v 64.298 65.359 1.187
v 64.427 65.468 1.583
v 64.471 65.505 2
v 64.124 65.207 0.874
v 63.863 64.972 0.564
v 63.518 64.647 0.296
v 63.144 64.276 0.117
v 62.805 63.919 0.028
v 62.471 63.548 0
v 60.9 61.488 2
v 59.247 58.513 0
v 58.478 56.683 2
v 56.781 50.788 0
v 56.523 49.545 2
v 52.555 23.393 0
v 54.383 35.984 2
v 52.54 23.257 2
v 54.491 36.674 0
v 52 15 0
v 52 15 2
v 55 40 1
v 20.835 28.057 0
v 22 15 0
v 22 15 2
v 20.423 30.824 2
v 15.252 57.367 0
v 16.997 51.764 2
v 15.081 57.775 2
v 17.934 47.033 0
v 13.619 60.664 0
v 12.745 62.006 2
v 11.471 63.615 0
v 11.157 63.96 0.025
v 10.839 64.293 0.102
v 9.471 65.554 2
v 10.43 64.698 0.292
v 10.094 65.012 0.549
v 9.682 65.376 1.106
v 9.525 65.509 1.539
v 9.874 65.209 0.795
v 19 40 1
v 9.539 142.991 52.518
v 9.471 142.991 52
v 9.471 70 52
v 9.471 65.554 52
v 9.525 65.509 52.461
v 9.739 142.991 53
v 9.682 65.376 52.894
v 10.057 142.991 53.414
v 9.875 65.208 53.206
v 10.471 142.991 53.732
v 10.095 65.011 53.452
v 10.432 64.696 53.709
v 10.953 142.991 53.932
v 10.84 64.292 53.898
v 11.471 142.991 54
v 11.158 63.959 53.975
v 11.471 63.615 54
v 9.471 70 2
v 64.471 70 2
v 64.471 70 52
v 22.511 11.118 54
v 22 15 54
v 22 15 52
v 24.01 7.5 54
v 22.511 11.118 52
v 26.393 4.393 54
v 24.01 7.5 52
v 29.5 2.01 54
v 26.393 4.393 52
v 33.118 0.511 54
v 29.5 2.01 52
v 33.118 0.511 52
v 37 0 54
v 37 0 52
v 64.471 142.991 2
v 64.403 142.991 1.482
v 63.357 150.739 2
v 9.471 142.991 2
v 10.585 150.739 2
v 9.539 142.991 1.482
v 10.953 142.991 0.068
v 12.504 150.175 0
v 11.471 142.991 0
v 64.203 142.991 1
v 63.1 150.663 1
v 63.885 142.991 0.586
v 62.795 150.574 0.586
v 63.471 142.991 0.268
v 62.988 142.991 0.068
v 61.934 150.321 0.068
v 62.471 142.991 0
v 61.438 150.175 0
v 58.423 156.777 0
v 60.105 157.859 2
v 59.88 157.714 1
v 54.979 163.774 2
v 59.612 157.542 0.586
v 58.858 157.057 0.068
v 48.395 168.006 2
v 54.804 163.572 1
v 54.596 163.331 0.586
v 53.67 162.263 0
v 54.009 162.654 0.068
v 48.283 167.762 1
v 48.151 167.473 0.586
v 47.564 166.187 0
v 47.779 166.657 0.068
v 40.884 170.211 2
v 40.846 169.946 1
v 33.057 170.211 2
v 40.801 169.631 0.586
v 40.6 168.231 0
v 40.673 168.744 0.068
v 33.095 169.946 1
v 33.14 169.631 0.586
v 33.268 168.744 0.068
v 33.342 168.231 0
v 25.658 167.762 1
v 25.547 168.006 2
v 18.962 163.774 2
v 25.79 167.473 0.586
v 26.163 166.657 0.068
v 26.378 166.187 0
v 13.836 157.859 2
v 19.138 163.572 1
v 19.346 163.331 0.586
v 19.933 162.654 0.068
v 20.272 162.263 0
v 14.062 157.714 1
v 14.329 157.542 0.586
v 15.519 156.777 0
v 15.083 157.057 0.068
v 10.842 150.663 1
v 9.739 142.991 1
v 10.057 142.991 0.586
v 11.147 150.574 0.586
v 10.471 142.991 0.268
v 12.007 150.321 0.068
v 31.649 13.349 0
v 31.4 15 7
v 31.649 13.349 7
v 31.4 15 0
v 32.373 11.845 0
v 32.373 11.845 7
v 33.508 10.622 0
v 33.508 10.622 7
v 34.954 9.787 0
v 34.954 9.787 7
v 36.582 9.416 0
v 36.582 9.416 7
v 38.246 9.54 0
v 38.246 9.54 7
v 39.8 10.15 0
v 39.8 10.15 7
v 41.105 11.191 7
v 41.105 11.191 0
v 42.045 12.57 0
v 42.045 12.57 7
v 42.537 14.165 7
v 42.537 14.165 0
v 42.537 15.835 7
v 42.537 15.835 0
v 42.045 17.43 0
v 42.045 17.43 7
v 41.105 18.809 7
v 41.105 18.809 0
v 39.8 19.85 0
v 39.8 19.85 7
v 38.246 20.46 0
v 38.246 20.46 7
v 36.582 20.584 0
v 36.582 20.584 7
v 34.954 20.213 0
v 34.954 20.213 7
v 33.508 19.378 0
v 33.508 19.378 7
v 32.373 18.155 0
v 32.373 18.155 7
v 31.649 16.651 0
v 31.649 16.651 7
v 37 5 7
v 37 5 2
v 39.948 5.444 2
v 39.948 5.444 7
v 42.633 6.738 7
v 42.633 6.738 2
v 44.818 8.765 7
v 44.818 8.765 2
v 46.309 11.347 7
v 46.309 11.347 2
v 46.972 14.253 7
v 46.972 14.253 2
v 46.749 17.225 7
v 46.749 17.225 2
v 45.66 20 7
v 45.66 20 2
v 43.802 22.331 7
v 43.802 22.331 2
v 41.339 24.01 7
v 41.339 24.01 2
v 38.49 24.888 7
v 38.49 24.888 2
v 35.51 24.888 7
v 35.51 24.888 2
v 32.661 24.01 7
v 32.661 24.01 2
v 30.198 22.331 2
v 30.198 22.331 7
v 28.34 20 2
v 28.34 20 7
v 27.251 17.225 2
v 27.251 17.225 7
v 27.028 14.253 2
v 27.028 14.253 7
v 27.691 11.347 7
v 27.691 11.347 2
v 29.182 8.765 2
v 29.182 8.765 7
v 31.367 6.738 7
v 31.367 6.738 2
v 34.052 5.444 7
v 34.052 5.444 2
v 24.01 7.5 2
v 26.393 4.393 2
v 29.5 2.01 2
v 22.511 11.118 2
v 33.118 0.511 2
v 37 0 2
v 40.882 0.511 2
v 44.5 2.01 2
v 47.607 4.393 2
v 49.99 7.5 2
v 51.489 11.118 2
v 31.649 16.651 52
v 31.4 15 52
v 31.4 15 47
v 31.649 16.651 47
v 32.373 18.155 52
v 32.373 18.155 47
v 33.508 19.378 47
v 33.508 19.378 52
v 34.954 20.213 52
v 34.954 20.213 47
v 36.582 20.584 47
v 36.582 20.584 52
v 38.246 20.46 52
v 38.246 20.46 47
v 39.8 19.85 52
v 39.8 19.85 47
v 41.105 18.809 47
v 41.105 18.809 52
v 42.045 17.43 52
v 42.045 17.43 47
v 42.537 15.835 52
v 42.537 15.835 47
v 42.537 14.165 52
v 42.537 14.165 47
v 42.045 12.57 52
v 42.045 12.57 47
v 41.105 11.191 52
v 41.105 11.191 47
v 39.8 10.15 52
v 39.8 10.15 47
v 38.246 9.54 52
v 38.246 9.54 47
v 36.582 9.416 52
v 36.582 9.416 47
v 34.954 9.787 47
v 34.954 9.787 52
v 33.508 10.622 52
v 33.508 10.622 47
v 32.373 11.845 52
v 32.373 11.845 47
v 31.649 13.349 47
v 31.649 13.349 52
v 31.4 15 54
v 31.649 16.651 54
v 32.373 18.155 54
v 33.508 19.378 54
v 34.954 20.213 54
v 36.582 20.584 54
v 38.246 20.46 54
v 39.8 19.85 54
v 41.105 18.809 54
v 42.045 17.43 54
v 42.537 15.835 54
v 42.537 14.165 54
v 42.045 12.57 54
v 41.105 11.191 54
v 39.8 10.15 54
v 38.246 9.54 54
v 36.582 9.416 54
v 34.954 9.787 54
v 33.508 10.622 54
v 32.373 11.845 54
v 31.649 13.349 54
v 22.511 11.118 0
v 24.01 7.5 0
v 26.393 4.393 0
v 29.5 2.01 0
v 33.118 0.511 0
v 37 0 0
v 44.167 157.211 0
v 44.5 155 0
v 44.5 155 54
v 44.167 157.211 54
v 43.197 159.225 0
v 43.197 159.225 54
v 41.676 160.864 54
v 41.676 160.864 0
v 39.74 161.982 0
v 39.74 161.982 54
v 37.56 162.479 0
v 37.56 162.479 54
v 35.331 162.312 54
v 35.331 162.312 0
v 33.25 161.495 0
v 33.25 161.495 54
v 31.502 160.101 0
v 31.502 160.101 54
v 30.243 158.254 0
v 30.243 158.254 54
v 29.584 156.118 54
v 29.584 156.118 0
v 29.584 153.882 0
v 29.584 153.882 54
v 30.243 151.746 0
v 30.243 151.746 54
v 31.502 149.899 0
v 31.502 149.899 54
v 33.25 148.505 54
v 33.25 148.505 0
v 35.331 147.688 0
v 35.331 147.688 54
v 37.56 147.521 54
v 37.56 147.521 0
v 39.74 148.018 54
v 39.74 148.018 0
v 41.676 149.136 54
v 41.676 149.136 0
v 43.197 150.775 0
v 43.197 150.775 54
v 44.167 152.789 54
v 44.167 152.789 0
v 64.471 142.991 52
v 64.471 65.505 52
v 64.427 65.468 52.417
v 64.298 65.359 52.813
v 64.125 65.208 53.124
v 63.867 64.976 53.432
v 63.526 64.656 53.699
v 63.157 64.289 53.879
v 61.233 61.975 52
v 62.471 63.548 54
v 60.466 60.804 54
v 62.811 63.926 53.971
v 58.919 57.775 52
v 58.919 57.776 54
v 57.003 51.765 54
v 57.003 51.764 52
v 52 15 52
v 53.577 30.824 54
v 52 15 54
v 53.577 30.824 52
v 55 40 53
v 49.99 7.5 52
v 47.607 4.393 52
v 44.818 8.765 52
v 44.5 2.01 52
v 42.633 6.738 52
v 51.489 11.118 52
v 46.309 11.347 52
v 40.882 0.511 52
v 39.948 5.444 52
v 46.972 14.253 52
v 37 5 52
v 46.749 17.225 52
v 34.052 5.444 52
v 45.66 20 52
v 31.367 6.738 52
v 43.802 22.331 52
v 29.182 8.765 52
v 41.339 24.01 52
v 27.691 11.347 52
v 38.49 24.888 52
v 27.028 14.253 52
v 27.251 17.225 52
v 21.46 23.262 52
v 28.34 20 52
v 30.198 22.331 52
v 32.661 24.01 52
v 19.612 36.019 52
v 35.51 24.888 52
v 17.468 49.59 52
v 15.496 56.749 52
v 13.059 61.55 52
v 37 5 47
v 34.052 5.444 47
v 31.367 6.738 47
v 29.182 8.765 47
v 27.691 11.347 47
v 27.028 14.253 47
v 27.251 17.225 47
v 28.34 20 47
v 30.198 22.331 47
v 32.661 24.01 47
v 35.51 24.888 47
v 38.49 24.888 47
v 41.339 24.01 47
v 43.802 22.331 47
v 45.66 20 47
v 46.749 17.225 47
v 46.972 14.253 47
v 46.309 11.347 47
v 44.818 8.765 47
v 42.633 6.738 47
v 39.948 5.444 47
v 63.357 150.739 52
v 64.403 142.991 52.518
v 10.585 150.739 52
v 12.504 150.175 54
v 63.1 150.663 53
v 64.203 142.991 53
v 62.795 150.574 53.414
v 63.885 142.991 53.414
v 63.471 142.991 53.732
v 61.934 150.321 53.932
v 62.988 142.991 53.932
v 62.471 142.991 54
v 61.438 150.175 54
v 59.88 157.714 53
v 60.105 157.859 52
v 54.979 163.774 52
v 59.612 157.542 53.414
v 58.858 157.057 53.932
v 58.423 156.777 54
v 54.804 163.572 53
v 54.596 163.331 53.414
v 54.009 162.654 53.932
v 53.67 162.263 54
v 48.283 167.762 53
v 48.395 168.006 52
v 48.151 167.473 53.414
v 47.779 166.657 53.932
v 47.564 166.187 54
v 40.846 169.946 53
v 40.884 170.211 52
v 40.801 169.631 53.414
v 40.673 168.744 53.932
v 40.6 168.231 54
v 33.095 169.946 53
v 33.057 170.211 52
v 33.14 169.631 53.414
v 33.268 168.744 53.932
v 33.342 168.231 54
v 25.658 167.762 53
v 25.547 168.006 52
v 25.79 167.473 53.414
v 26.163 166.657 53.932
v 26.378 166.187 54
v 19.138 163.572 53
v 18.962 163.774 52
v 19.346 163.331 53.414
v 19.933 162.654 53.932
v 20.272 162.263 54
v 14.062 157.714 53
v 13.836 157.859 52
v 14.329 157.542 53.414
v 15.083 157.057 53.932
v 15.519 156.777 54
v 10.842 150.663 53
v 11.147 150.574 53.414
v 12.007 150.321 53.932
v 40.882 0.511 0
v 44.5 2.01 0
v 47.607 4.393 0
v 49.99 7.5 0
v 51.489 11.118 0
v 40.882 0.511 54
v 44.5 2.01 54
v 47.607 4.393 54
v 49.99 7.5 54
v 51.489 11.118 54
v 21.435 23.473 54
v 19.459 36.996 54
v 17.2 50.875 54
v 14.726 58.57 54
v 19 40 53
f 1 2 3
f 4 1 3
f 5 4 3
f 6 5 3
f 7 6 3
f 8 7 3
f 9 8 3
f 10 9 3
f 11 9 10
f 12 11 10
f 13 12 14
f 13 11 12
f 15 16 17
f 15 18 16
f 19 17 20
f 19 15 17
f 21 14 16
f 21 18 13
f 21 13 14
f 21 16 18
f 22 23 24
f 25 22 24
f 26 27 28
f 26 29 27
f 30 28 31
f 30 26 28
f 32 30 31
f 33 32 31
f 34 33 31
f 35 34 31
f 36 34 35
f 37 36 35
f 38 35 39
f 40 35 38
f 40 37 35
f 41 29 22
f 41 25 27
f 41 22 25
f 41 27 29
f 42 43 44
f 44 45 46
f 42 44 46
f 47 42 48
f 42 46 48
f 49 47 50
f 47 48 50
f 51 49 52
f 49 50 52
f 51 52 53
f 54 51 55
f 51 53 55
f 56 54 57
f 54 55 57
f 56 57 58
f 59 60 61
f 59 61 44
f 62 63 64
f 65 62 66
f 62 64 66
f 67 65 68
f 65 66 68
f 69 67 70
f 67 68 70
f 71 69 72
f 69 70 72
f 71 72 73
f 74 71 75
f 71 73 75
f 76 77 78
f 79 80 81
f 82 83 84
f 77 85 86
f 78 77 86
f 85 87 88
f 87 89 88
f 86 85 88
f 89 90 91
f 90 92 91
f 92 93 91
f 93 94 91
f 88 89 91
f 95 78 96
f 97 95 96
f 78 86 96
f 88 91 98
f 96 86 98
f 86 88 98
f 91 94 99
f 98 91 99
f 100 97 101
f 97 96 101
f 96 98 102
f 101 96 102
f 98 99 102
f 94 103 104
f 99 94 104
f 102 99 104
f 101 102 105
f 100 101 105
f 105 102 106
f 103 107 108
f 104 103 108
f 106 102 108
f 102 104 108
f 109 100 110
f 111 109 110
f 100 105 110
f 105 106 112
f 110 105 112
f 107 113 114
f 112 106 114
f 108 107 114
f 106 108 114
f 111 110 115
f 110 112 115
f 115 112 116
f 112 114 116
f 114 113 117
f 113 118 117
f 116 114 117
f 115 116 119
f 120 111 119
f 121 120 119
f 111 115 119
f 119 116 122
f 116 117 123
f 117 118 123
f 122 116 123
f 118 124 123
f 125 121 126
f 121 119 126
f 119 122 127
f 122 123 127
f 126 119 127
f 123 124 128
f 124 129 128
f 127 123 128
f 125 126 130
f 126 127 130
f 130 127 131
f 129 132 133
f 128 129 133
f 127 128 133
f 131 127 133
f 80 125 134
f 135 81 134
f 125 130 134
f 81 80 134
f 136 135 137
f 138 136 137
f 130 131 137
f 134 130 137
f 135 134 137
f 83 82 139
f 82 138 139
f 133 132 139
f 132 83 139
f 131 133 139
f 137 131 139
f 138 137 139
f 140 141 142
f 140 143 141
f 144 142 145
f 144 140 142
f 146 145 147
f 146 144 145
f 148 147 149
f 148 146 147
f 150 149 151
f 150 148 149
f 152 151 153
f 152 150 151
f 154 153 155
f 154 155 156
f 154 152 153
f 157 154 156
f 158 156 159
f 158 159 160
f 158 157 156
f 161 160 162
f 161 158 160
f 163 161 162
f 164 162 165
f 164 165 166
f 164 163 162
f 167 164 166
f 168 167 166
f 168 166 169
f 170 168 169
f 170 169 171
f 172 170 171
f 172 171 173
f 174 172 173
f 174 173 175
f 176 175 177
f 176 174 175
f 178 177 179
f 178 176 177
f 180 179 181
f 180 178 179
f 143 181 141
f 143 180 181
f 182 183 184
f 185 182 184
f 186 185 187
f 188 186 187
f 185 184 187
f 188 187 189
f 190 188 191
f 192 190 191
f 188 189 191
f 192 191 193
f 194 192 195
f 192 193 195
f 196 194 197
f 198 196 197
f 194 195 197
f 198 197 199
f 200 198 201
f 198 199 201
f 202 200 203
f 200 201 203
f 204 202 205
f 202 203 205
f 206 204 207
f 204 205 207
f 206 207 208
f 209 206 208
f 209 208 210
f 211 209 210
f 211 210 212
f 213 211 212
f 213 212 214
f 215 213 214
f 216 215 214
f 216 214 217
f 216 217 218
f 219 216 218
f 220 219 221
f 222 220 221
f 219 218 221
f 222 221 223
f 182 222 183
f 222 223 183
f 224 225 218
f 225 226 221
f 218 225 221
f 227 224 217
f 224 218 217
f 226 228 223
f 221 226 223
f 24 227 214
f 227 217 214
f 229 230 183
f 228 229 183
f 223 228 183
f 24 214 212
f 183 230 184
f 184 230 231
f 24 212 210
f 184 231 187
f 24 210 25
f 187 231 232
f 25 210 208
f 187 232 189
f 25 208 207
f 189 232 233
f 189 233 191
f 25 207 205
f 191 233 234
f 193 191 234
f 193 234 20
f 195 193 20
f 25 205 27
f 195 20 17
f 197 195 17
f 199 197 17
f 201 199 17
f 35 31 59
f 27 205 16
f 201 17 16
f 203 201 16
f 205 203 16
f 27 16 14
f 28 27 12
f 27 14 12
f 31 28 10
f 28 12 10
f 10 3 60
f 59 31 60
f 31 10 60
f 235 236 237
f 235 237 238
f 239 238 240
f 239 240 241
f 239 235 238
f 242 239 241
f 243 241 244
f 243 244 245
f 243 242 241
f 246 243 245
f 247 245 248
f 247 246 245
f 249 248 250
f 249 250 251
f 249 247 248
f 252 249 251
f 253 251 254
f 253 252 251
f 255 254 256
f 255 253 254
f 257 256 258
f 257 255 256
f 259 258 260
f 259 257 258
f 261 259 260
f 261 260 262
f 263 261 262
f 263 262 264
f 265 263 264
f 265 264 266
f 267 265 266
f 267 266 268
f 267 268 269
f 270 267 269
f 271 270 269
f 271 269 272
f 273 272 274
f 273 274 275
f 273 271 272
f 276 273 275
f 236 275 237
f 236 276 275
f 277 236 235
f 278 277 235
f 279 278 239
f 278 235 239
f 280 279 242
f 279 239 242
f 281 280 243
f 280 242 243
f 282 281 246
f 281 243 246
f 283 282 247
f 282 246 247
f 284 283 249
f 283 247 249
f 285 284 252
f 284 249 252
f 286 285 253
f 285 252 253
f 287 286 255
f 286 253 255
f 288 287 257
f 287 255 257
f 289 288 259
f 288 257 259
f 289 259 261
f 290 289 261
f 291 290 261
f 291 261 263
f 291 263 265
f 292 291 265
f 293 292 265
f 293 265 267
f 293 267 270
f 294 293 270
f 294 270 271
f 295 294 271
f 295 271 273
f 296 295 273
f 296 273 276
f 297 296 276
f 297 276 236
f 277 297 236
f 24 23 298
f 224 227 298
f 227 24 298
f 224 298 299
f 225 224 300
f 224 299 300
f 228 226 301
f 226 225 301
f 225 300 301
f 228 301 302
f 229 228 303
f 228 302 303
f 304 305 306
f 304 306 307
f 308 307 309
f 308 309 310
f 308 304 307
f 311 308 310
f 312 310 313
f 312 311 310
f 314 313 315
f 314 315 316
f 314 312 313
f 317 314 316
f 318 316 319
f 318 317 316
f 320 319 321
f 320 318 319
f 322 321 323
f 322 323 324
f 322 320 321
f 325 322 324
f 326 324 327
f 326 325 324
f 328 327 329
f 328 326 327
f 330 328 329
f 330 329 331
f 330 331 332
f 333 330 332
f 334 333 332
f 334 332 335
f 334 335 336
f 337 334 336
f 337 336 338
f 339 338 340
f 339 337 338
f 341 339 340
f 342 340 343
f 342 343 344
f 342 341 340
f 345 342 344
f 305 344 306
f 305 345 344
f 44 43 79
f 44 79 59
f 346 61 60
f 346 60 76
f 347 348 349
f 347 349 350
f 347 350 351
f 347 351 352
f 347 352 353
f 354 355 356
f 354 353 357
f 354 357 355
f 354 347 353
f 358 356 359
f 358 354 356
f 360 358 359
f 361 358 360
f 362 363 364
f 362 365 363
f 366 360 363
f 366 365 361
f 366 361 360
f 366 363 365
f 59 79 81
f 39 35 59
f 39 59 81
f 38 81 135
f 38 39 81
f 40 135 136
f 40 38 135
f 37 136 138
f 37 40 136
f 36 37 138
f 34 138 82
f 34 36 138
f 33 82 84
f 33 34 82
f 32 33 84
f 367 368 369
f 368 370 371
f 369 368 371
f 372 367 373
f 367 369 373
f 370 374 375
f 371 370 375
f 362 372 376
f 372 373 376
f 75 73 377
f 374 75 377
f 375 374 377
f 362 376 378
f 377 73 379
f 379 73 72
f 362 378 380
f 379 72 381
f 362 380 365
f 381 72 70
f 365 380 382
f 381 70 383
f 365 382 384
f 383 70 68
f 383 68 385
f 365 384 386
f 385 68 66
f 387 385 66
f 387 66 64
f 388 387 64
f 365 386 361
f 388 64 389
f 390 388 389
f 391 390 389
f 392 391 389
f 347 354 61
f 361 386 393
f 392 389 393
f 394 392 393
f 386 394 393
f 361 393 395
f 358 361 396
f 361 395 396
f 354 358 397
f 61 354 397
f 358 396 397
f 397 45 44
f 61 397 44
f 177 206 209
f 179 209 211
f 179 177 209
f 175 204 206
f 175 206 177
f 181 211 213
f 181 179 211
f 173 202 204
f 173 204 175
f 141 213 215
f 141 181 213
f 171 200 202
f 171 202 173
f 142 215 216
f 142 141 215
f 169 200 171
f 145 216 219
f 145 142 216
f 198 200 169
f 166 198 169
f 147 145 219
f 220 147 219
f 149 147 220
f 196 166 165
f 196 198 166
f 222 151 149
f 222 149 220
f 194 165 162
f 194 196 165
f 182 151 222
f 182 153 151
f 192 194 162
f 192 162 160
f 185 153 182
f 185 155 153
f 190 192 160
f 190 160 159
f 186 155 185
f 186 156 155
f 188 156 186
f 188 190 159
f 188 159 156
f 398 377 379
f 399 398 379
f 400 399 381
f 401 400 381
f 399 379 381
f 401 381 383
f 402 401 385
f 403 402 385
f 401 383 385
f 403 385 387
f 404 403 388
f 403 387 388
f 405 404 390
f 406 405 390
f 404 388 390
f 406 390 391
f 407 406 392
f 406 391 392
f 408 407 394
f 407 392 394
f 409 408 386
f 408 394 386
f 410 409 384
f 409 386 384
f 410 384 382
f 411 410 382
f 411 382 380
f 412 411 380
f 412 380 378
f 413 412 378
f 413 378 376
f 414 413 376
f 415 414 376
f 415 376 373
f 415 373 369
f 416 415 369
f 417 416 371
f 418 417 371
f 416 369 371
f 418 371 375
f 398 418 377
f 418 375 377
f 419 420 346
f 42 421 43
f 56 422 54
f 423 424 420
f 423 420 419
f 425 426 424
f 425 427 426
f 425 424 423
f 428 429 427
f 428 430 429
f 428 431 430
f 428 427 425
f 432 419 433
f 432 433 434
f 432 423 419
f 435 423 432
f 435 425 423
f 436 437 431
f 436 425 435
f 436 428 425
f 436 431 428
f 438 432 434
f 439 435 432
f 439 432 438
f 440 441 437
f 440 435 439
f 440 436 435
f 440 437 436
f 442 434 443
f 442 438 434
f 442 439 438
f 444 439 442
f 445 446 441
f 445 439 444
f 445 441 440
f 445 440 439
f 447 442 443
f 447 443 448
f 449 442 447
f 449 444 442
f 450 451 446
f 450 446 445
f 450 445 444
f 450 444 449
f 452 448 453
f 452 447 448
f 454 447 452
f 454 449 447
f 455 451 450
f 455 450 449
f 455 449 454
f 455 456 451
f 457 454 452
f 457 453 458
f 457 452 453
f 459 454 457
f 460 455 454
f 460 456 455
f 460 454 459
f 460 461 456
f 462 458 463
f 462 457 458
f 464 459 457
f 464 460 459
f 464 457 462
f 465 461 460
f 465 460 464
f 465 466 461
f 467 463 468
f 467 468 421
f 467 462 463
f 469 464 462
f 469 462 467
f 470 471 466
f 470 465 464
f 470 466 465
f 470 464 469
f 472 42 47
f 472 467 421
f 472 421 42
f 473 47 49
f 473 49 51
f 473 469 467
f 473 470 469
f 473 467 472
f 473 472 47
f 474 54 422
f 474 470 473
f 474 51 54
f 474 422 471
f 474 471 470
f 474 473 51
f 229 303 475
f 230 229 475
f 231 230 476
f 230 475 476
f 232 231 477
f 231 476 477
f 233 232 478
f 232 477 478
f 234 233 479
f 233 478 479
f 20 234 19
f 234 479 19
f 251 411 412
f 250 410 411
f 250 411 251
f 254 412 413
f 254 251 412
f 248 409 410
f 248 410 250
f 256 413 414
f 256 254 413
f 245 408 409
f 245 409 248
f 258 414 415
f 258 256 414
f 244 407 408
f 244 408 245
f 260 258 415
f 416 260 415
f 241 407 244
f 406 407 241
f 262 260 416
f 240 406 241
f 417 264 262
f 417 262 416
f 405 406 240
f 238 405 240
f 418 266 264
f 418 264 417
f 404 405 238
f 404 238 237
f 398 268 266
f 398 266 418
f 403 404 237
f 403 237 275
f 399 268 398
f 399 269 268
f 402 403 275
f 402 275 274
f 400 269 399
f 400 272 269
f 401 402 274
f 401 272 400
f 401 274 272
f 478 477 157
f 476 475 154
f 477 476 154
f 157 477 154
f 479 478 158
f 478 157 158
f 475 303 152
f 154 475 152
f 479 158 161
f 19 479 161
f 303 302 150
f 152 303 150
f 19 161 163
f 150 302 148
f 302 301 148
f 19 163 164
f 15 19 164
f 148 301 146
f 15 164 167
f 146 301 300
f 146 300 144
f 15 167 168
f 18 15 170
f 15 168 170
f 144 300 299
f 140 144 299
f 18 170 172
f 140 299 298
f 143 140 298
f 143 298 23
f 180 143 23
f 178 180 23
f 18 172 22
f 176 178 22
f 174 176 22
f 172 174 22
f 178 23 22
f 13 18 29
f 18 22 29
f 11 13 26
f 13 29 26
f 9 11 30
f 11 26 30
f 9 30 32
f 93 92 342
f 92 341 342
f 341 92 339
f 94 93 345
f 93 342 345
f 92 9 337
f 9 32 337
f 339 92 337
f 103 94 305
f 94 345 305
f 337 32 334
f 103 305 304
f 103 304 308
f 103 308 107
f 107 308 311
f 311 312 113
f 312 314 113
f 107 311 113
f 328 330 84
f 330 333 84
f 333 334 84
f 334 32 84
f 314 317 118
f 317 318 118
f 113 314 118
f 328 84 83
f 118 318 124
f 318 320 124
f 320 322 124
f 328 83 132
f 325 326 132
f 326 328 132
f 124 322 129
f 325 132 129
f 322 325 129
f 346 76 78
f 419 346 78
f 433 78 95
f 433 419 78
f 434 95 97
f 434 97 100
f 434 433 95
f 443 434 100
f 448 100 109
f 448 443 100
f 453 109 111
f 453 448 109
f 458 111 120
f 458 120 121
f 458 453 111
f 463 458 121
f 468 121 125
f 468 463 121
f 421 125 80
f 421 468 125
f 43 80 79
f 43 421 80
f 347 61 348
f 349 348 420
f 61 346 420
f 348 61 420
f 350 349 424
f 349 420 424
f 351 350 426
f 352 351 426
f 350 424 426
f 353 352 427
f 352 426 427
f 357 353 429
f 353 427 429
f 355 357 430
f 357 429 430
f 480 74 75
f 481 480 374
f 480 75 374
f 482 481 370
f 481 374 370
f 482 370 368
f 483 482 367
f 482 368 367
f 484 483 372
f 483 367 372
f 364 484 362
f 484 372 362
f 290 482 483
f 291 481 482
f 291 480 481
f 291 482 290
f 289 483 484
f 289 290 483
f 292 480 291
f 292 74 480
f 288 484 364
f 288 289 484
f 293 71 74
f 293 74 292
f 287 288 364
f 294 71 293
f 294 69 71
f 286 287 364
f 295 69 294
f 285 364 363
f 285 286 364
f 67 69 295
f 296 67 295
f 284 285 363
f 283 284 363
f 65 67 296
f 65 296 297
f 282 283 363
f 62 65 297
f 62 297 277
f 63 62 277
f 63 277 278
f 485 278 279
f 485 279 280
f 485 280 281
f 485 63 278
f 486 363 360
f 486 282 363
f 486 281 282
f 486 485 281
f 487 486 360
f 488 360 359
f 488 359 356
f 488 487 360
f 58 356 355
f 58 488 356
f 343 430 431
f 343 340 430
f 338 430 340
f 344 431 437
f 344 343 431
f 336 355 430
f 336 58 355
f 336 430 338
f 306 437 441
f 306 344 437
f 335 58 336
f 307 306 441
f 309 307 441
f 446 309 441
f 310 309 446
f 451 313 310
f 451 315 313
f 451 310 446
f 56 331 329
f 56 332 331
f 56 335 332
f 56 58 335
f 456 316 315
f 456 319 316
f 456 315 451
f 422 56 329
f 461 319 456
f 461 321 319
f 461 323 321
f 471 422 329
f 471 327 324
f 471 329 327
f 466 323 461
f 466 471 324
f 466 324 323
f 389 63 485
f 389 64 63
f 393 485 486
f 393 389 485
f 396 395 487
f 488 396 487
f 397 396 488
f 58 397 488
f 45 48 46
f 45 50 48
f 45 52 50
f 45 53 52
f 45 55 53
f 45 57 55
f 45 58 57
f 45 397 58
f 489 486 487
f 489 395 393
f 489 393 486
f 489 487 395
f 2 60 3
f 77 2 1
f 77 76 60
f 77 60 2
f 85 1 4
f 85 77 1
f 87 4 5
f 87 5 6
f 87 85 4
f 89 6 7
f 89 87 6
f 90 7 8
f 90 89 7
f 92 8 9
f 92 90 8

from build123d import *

# Parameters (mm, degrees)
CROQUIS1_R              = 5.6
CROQUIS1_R_2            = 7.5
SALIENTE_EXTRUIR1_DEPTH = 54
CROQUIS6_W              = 54
CROQUIS6_H              = 70
SALIENTE_EXTRUIR3_DEPTH = 74
CORTAR_EXTRUIR13_DEPTH  = 74
CORTAR_EXTRUIR14_DEPTH  = 74
CROQUIS9_W              = 3
CROQUIS9_H              = 11.2
CORTAR_EXTRUIR15_DEPTH  = 74
CROQUIS10_R             = 5.6
CORTAR_EXTRUIR16_DEPTH  = 74
CROQUIS11_R             = 10
CROQUIS11_R_2           = 5.6
SALIENTE_EXTRUIR4_DEPTH = 5
CROQUIS12_R             = 10
CROQUIS12_R_2           = 5.6
SALIENTE_EXTRUIR5_DEPTH = 5
CROQUIS13_W             = 50
CROQUIS13_H             = 73
CORTAR_EXTRUIR17_DEPTH  = 74
CROQUIS14_W             = 74
CROQUIS14_H             = 73
SALIENTE_EXTRUIR6_DEPTH = 54
CORTAR_EXTRUIR18_DEPTH  = 54
REDONDEO3_R             = 2
REDONDEO4_R             = 2


with BuildPart() as part:
    # Croquis1 → Saliente-Extruir1 (new body)
    with BuildSketch(Plane.XY):
        with BuildLine():
            Line((0, 143), (0, 70))
            add(Edge.make_bspline(
                [(22, 15), (22, 22.317960933), (17.777719643, 44.524463784), (15.903513438, 66.300635574), (0, 70)],
                knots=[0, 0, 0, 0, 0.399675276, 1, 1, 1, 1], degree=3))
            ThreePointArc((22, 15), (37, 0), (52, 15))
            add(Edge.make_bspline(
                [(52, 15), (52, 22.317960933), (56.222280357, 44.524463784), (58.096486562, 66.300635574), (74, 70)],
                knots=[0, 0, 0, 0, 0.399675276, 1, 1, 1, 1], degree=3))
            Line((74, 70), (74, 143))
            ThreePointArc((74, 143), (37, 180), (0, 143))
        make_face()
        with Locations((37, 15)):
            Circle(CROQUIS1_R, mode=Mode.SUBTRACT)
        with Locations((37, 155)):
            Circle(CROQUIS1_R_2, mode=Mode.SUBTRACT)
    extrude(amount=SALIENTE_EXTRUIR1_DEPTH)

    # Croquis6 → Saliente-Extruir3 (add)
    with BuildSketch(Plane.ZY):
        with Locations((27, 35)):
            Rectangle(CROQUIS6_W, CROQUIS6_H)
    extrude(amount=-SALIENTE_EXTRUIR3_DEPTH)

    # Croquis7 → Cortar-Extruir13 (cut)
    with BuildSketch(Plane(origin=(74, 0, 0), x_dir=(0, 0, -1), z_dir=(1, 0, 0))):
        Polygon((-52, 0), (-2, 0), (-2, 9.4), (-5, 9.4), (-5, 20.6), (-2, 20.6), (-2, 70), (-52, 70), (-52, 20.6), (-49, 20.6), (-49, 9.4), (-52, 9.4), align=None)
    extrude(amount=-CORTAR_EXTRUIR13_DEPTH, mode=Mode.SUBTRACT)

    # Croquis8 → Cortar-Extruir14 (cut)
    with BuildSketch(Plane(origin=(0, 0, 0), x_dir=(-1, 0, 0), z_dir=(0, 0, -1))):
        with BuildLine():
            add(Edge.make_bspline(
                [(-74, 70), (-58.096486562, 66.300635574), (-56.222280357, 44.524463784), (-52, 22.317960933), (-52, 15)],
                knots=[0, 0, 0, 0, 0.600324724, 1, 1, 1, 1], degree=3))
            Line((-74, 70), (-74, 0))
            Line((-74, 0), (-37, 0))
            ThreePointArc((-37, 0), (-47.606601718, 4.393398282), (-52, 15))
        make_face()
        with BuildLine():
            ThreePointArc((-22, 15), (-26.393398282, 4.393398282), (-37, 0))
            Line((-37, 0), (0, 0))
            Line((0, 0), (0, 70))
            add(Edge.make_bspline(
                [(-22, 15), (-22, 22.317960933), (-17.777719643, 44.524463784), (-15.903513438, 66.300635574), (0, 70)],
                knots=[0, 0, 0, 0, 0.399675276, 1, 1, 1, 1], degree=3))
        make_face()
    extrude(amount=-CORTAR_EXTRUIR14_DEPTH, mode=Mode.SUBTRACT)

    # Croquis9 → Cortar-Extruir15 (cut)
    with BuildSketch(Plane(origin=(74, 0, 0), x_dir=(0, 0, -1), z_dir=(1, 0, 0))):
        with Locations((-50.5, 15)):
            Rectangle(CROQUIS9_W, CROQUIS9_H)
        Polygon((-2, 20.6), (-5.198845147, 20.6), (-5, 9.4), (-2, 9.4), align=None)
    extrude(amount=-CORTAR_EXTRUIR15_DEPTH, mode=Mode.SUBTRACT)

    # Croquis10 → Cortar-Extruir16 (cut)
    with BuildSketch(Plane(origin=(0, 0, 0), x_dir=(-1, 0, 0), z_dir=(0, 0, -1))):
        with Locations((-37, 15)):
            Circle(CROQUIS10_R)
    extrude(amount=-CORTAR_EXTRUIR16_DEPTH, mode=Mode.SUBTRACT)

    # Croquis11 → Saliente-Extruir4 (add)
    with BuildSketch(Plane(origin=(0, 0, 52), x_dir=(-1, 0, 0), z_dir=(0, 0, -1))):
        with Locations(Location((-37, 15, 0), (0, 0, 270))):
            Circle(CROQUIS11_R)
        with Locations((-37, 15)):
            Circle(CROQUIS11_R_2, mode=Mode.SUBTRACT)
    extrude(amount=SALIENTE_EXTRUIR4_DEPTH)

    # Croquis12 → Saliente-Extruir5 (add)
    with BuildSketch(Plane.XY.offset(2)):
        with Locations(Location((37, 15, 0), (0, 0, 270))):
            Circle(CROQUIS12_R)
        with Locations(Location((37, 15, 0), (0, 0, 180))):
            Circle(CROQUIS12_R_2, mode=Mode.SUBTRACT)
    extrude(amount=SALIENTE_EXTRUIR5_DEPTH)

    # Croquis13 → Cortar-Extruir17 (cut)
    with BuildSketch(Plane.ZY):
        with Locations((27, 106.5)):
            Rectangle(CROQUIS13_W, CROQUIS13_H)
    extrude(amount=-CORTAR_EXTRUIR17_DEPTH, mode=Mode.SUBTRACT)

    # Croquis14 → Saliente-Extruir6 (add)
    with BuildSketch(Plane(origin=(0, 0, 0), x_dir=(-1, 0, 0), z_dir=(0, 0, -1))):
        with Locations((-37, 106.5)):
            Rectangle(CROQUIS14_W, CROQUIS14_H)
    extrude(amount=-SALIENTE_EXTRUIR6_DEPTH)

    # Croquis15 → Cortar-Extruir18 (cut)
    with BuildSketch(Plane.XY.offset(54)):
        with BuildLine():
            Line((9.470720421, 142.990900166), (9.470720421, 62.137684014))
            Line((9.470720421, 62.137684014), (-11.518865127, 62.137684014))
            Line((-11.518865127, 62.137684014), (-11.518865127, 188.692436646))
            Line((-11.518865127, 188.692436646), (98.86488905, 188.692436646))
            Line((98.86488905, 188.692436646), (98.86488905, 62.137684014))
            Line((98.86488905, 62.137684014), (64.470720421, 62.137684014))
            Line((64.470720421, 62.137684014), (64.470720421, 142.990900166))
            ThreePointArc((64.470720421, 142.990900166), (36.970720421, 170.490900166), (9.470720421, 142.990900166))
        make_face()
    extrude(amount=-CORTAR_EXTRUIR18_DEPTH, mode=Mode.SUBTRACT)

    # Redondeo3
    redondeo3_edges = [part.edges().sort_by_distance(p)[0] for p in [
        (9.470720421, 104.272545077, 54),
        (36.970720421, 170.490900166, 54),
        (64.470720421, 104.24810361, 54),
    ]]
    fillet(redondeo3_edges, radius=REDONDEO3_R)

    # Redondeo4
    redondeo4_edges = [part.edges().sort_by_distance(p)[0] for p in [
        (36.970720421, 170.490900166, 0),
        (9.470720421, 104.272545072, 0),
        (64.470720421, 104.248103603, 0),
    ]]
    fillet(redondeo4_edges, radius=REDONDEO4_R)


solid = part.part
